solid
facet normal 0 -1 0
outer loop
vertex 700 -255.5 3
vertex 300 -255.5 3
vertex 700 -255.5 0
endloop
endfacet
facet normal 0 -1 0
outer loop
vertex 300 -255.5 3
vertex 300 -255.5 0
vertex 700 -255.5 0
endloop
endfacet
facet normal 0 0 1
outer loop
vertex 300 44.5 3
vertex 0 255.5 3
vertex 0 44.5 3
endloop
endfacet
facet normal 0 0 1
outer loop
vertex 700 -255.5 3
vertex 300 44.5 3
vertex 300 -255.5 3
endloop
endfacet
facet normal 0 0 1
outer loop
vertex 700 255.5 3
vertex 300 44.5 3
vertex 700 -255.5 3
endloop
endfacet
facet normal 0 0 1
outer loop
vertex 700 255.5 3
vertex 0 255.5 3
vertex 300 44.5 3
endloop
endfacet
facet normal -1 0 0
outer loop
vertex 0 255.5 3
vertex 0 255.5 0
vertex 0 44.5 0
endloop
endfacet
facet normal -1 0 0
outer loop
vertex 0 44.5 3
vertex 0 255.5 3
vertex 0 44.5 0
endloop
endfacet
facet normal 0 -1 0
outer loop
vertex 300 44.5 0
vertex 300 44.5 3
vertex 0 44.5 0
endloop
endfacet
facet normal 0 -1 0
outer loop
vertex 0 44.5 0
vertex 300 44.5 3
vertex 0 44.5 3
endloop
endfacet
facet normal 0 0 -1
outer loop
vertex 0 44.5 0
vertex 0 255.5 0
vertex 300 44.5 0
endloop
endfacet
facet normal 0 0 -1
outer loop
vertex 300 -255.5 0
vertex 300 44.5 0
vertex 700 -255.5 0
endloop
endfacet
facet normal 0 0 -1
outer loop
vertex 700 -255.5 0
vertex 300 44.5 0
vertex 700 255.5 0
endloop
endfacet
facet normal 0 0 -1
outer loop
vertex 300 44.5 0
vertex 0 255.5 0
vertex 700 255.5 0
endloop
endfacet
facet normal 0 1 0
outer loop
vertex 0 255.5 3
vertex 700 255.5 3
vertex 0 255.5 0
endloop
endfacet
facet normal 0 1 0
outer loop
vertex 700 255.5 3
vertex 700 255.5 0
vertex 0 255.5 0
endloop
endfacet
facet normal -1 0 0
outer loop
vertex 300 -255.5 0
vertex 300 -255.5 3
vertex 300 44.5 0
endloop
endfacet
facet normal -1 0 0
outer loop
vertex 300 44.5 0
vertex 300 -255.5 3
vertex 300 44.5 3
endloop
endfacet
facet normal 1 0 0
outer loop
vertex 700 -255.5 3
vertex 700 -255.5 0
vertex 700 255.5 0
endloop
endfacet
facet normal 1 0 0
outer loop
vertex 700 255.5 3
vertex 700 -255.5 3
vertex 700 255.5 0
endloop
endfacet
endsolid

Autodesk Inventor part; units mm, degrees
ref_plane "YZ Plane" through (0, 0, 0) normal (1, 0, 0) x (0, 1, 0)
ref_plane "XZ Plane" through (0, 0, 0) normal (0, 1, 0) x (-1, 0, 0)
ref_plane "XY Plane" through (0, 0, 0) normal (0, 0, 1) x (1, 0, 0)
sketch "Sketch1" plane through (0, 0, 0) normal (0, 0, 1) x (1, 0, 0)
  line L0 (0, -255.5) -> (700, -255.5)
  line L1 (700, -255.5) -> (700, 255.5)
  line L2 (700, 255.5) -> (0, 255.5)
  line L3 (0, 255.5) -> (0, -255.5)
  point P0 (0, 0)
  point P1 (0, 0)
  dimension "d0" = 700
  dimension "d1" = 511
extrude "Plate1" add sketch "Sketch1" along normal blind 3
sketch "Sketch6" plane through (0, 0, 3) normal (0, 0, 1) x (1, 0, 0)
  line L0 (0, -255.5) -> (700, -255.5) projected
  line L1 (0, -255.5) -> (300, -255.5)
  line L2 (300, -255.5) -> (300, 44.5)
  line L3 (300, 44.5) -> (0, 44.5)
  line L4 (0, 44.5) -> (0, -255.5)
  point P0 (0, 0)
  dimension "d36" = 300
  dimension "d37" = 300
extrude "Extrusion2" cut sketch "Sketch6" against normal up to surface (3 mm away)
equation "\"d2\" = Thickness"
equation "\"BendReliefWidth\" = Thickness"
equation "\"BendReliefDepth\" = 0.5 * Thickness"
equation "\"CornerReliefSize\" = 4 * Thickness"
equation "\"MinimumRemnant\" = 2 * Thickness"
equation "\"TransitionRadius\" = BendRadius"
equation "\"JacobiRadiusSize\" = BendRadius"
equation "\"GapSize\" = Thickness"
equation "\"Thickness\" = 3"
equation "\"BendRadius\" = 5"
properties part number "BSH 053 sheet in" material "09g2s"
